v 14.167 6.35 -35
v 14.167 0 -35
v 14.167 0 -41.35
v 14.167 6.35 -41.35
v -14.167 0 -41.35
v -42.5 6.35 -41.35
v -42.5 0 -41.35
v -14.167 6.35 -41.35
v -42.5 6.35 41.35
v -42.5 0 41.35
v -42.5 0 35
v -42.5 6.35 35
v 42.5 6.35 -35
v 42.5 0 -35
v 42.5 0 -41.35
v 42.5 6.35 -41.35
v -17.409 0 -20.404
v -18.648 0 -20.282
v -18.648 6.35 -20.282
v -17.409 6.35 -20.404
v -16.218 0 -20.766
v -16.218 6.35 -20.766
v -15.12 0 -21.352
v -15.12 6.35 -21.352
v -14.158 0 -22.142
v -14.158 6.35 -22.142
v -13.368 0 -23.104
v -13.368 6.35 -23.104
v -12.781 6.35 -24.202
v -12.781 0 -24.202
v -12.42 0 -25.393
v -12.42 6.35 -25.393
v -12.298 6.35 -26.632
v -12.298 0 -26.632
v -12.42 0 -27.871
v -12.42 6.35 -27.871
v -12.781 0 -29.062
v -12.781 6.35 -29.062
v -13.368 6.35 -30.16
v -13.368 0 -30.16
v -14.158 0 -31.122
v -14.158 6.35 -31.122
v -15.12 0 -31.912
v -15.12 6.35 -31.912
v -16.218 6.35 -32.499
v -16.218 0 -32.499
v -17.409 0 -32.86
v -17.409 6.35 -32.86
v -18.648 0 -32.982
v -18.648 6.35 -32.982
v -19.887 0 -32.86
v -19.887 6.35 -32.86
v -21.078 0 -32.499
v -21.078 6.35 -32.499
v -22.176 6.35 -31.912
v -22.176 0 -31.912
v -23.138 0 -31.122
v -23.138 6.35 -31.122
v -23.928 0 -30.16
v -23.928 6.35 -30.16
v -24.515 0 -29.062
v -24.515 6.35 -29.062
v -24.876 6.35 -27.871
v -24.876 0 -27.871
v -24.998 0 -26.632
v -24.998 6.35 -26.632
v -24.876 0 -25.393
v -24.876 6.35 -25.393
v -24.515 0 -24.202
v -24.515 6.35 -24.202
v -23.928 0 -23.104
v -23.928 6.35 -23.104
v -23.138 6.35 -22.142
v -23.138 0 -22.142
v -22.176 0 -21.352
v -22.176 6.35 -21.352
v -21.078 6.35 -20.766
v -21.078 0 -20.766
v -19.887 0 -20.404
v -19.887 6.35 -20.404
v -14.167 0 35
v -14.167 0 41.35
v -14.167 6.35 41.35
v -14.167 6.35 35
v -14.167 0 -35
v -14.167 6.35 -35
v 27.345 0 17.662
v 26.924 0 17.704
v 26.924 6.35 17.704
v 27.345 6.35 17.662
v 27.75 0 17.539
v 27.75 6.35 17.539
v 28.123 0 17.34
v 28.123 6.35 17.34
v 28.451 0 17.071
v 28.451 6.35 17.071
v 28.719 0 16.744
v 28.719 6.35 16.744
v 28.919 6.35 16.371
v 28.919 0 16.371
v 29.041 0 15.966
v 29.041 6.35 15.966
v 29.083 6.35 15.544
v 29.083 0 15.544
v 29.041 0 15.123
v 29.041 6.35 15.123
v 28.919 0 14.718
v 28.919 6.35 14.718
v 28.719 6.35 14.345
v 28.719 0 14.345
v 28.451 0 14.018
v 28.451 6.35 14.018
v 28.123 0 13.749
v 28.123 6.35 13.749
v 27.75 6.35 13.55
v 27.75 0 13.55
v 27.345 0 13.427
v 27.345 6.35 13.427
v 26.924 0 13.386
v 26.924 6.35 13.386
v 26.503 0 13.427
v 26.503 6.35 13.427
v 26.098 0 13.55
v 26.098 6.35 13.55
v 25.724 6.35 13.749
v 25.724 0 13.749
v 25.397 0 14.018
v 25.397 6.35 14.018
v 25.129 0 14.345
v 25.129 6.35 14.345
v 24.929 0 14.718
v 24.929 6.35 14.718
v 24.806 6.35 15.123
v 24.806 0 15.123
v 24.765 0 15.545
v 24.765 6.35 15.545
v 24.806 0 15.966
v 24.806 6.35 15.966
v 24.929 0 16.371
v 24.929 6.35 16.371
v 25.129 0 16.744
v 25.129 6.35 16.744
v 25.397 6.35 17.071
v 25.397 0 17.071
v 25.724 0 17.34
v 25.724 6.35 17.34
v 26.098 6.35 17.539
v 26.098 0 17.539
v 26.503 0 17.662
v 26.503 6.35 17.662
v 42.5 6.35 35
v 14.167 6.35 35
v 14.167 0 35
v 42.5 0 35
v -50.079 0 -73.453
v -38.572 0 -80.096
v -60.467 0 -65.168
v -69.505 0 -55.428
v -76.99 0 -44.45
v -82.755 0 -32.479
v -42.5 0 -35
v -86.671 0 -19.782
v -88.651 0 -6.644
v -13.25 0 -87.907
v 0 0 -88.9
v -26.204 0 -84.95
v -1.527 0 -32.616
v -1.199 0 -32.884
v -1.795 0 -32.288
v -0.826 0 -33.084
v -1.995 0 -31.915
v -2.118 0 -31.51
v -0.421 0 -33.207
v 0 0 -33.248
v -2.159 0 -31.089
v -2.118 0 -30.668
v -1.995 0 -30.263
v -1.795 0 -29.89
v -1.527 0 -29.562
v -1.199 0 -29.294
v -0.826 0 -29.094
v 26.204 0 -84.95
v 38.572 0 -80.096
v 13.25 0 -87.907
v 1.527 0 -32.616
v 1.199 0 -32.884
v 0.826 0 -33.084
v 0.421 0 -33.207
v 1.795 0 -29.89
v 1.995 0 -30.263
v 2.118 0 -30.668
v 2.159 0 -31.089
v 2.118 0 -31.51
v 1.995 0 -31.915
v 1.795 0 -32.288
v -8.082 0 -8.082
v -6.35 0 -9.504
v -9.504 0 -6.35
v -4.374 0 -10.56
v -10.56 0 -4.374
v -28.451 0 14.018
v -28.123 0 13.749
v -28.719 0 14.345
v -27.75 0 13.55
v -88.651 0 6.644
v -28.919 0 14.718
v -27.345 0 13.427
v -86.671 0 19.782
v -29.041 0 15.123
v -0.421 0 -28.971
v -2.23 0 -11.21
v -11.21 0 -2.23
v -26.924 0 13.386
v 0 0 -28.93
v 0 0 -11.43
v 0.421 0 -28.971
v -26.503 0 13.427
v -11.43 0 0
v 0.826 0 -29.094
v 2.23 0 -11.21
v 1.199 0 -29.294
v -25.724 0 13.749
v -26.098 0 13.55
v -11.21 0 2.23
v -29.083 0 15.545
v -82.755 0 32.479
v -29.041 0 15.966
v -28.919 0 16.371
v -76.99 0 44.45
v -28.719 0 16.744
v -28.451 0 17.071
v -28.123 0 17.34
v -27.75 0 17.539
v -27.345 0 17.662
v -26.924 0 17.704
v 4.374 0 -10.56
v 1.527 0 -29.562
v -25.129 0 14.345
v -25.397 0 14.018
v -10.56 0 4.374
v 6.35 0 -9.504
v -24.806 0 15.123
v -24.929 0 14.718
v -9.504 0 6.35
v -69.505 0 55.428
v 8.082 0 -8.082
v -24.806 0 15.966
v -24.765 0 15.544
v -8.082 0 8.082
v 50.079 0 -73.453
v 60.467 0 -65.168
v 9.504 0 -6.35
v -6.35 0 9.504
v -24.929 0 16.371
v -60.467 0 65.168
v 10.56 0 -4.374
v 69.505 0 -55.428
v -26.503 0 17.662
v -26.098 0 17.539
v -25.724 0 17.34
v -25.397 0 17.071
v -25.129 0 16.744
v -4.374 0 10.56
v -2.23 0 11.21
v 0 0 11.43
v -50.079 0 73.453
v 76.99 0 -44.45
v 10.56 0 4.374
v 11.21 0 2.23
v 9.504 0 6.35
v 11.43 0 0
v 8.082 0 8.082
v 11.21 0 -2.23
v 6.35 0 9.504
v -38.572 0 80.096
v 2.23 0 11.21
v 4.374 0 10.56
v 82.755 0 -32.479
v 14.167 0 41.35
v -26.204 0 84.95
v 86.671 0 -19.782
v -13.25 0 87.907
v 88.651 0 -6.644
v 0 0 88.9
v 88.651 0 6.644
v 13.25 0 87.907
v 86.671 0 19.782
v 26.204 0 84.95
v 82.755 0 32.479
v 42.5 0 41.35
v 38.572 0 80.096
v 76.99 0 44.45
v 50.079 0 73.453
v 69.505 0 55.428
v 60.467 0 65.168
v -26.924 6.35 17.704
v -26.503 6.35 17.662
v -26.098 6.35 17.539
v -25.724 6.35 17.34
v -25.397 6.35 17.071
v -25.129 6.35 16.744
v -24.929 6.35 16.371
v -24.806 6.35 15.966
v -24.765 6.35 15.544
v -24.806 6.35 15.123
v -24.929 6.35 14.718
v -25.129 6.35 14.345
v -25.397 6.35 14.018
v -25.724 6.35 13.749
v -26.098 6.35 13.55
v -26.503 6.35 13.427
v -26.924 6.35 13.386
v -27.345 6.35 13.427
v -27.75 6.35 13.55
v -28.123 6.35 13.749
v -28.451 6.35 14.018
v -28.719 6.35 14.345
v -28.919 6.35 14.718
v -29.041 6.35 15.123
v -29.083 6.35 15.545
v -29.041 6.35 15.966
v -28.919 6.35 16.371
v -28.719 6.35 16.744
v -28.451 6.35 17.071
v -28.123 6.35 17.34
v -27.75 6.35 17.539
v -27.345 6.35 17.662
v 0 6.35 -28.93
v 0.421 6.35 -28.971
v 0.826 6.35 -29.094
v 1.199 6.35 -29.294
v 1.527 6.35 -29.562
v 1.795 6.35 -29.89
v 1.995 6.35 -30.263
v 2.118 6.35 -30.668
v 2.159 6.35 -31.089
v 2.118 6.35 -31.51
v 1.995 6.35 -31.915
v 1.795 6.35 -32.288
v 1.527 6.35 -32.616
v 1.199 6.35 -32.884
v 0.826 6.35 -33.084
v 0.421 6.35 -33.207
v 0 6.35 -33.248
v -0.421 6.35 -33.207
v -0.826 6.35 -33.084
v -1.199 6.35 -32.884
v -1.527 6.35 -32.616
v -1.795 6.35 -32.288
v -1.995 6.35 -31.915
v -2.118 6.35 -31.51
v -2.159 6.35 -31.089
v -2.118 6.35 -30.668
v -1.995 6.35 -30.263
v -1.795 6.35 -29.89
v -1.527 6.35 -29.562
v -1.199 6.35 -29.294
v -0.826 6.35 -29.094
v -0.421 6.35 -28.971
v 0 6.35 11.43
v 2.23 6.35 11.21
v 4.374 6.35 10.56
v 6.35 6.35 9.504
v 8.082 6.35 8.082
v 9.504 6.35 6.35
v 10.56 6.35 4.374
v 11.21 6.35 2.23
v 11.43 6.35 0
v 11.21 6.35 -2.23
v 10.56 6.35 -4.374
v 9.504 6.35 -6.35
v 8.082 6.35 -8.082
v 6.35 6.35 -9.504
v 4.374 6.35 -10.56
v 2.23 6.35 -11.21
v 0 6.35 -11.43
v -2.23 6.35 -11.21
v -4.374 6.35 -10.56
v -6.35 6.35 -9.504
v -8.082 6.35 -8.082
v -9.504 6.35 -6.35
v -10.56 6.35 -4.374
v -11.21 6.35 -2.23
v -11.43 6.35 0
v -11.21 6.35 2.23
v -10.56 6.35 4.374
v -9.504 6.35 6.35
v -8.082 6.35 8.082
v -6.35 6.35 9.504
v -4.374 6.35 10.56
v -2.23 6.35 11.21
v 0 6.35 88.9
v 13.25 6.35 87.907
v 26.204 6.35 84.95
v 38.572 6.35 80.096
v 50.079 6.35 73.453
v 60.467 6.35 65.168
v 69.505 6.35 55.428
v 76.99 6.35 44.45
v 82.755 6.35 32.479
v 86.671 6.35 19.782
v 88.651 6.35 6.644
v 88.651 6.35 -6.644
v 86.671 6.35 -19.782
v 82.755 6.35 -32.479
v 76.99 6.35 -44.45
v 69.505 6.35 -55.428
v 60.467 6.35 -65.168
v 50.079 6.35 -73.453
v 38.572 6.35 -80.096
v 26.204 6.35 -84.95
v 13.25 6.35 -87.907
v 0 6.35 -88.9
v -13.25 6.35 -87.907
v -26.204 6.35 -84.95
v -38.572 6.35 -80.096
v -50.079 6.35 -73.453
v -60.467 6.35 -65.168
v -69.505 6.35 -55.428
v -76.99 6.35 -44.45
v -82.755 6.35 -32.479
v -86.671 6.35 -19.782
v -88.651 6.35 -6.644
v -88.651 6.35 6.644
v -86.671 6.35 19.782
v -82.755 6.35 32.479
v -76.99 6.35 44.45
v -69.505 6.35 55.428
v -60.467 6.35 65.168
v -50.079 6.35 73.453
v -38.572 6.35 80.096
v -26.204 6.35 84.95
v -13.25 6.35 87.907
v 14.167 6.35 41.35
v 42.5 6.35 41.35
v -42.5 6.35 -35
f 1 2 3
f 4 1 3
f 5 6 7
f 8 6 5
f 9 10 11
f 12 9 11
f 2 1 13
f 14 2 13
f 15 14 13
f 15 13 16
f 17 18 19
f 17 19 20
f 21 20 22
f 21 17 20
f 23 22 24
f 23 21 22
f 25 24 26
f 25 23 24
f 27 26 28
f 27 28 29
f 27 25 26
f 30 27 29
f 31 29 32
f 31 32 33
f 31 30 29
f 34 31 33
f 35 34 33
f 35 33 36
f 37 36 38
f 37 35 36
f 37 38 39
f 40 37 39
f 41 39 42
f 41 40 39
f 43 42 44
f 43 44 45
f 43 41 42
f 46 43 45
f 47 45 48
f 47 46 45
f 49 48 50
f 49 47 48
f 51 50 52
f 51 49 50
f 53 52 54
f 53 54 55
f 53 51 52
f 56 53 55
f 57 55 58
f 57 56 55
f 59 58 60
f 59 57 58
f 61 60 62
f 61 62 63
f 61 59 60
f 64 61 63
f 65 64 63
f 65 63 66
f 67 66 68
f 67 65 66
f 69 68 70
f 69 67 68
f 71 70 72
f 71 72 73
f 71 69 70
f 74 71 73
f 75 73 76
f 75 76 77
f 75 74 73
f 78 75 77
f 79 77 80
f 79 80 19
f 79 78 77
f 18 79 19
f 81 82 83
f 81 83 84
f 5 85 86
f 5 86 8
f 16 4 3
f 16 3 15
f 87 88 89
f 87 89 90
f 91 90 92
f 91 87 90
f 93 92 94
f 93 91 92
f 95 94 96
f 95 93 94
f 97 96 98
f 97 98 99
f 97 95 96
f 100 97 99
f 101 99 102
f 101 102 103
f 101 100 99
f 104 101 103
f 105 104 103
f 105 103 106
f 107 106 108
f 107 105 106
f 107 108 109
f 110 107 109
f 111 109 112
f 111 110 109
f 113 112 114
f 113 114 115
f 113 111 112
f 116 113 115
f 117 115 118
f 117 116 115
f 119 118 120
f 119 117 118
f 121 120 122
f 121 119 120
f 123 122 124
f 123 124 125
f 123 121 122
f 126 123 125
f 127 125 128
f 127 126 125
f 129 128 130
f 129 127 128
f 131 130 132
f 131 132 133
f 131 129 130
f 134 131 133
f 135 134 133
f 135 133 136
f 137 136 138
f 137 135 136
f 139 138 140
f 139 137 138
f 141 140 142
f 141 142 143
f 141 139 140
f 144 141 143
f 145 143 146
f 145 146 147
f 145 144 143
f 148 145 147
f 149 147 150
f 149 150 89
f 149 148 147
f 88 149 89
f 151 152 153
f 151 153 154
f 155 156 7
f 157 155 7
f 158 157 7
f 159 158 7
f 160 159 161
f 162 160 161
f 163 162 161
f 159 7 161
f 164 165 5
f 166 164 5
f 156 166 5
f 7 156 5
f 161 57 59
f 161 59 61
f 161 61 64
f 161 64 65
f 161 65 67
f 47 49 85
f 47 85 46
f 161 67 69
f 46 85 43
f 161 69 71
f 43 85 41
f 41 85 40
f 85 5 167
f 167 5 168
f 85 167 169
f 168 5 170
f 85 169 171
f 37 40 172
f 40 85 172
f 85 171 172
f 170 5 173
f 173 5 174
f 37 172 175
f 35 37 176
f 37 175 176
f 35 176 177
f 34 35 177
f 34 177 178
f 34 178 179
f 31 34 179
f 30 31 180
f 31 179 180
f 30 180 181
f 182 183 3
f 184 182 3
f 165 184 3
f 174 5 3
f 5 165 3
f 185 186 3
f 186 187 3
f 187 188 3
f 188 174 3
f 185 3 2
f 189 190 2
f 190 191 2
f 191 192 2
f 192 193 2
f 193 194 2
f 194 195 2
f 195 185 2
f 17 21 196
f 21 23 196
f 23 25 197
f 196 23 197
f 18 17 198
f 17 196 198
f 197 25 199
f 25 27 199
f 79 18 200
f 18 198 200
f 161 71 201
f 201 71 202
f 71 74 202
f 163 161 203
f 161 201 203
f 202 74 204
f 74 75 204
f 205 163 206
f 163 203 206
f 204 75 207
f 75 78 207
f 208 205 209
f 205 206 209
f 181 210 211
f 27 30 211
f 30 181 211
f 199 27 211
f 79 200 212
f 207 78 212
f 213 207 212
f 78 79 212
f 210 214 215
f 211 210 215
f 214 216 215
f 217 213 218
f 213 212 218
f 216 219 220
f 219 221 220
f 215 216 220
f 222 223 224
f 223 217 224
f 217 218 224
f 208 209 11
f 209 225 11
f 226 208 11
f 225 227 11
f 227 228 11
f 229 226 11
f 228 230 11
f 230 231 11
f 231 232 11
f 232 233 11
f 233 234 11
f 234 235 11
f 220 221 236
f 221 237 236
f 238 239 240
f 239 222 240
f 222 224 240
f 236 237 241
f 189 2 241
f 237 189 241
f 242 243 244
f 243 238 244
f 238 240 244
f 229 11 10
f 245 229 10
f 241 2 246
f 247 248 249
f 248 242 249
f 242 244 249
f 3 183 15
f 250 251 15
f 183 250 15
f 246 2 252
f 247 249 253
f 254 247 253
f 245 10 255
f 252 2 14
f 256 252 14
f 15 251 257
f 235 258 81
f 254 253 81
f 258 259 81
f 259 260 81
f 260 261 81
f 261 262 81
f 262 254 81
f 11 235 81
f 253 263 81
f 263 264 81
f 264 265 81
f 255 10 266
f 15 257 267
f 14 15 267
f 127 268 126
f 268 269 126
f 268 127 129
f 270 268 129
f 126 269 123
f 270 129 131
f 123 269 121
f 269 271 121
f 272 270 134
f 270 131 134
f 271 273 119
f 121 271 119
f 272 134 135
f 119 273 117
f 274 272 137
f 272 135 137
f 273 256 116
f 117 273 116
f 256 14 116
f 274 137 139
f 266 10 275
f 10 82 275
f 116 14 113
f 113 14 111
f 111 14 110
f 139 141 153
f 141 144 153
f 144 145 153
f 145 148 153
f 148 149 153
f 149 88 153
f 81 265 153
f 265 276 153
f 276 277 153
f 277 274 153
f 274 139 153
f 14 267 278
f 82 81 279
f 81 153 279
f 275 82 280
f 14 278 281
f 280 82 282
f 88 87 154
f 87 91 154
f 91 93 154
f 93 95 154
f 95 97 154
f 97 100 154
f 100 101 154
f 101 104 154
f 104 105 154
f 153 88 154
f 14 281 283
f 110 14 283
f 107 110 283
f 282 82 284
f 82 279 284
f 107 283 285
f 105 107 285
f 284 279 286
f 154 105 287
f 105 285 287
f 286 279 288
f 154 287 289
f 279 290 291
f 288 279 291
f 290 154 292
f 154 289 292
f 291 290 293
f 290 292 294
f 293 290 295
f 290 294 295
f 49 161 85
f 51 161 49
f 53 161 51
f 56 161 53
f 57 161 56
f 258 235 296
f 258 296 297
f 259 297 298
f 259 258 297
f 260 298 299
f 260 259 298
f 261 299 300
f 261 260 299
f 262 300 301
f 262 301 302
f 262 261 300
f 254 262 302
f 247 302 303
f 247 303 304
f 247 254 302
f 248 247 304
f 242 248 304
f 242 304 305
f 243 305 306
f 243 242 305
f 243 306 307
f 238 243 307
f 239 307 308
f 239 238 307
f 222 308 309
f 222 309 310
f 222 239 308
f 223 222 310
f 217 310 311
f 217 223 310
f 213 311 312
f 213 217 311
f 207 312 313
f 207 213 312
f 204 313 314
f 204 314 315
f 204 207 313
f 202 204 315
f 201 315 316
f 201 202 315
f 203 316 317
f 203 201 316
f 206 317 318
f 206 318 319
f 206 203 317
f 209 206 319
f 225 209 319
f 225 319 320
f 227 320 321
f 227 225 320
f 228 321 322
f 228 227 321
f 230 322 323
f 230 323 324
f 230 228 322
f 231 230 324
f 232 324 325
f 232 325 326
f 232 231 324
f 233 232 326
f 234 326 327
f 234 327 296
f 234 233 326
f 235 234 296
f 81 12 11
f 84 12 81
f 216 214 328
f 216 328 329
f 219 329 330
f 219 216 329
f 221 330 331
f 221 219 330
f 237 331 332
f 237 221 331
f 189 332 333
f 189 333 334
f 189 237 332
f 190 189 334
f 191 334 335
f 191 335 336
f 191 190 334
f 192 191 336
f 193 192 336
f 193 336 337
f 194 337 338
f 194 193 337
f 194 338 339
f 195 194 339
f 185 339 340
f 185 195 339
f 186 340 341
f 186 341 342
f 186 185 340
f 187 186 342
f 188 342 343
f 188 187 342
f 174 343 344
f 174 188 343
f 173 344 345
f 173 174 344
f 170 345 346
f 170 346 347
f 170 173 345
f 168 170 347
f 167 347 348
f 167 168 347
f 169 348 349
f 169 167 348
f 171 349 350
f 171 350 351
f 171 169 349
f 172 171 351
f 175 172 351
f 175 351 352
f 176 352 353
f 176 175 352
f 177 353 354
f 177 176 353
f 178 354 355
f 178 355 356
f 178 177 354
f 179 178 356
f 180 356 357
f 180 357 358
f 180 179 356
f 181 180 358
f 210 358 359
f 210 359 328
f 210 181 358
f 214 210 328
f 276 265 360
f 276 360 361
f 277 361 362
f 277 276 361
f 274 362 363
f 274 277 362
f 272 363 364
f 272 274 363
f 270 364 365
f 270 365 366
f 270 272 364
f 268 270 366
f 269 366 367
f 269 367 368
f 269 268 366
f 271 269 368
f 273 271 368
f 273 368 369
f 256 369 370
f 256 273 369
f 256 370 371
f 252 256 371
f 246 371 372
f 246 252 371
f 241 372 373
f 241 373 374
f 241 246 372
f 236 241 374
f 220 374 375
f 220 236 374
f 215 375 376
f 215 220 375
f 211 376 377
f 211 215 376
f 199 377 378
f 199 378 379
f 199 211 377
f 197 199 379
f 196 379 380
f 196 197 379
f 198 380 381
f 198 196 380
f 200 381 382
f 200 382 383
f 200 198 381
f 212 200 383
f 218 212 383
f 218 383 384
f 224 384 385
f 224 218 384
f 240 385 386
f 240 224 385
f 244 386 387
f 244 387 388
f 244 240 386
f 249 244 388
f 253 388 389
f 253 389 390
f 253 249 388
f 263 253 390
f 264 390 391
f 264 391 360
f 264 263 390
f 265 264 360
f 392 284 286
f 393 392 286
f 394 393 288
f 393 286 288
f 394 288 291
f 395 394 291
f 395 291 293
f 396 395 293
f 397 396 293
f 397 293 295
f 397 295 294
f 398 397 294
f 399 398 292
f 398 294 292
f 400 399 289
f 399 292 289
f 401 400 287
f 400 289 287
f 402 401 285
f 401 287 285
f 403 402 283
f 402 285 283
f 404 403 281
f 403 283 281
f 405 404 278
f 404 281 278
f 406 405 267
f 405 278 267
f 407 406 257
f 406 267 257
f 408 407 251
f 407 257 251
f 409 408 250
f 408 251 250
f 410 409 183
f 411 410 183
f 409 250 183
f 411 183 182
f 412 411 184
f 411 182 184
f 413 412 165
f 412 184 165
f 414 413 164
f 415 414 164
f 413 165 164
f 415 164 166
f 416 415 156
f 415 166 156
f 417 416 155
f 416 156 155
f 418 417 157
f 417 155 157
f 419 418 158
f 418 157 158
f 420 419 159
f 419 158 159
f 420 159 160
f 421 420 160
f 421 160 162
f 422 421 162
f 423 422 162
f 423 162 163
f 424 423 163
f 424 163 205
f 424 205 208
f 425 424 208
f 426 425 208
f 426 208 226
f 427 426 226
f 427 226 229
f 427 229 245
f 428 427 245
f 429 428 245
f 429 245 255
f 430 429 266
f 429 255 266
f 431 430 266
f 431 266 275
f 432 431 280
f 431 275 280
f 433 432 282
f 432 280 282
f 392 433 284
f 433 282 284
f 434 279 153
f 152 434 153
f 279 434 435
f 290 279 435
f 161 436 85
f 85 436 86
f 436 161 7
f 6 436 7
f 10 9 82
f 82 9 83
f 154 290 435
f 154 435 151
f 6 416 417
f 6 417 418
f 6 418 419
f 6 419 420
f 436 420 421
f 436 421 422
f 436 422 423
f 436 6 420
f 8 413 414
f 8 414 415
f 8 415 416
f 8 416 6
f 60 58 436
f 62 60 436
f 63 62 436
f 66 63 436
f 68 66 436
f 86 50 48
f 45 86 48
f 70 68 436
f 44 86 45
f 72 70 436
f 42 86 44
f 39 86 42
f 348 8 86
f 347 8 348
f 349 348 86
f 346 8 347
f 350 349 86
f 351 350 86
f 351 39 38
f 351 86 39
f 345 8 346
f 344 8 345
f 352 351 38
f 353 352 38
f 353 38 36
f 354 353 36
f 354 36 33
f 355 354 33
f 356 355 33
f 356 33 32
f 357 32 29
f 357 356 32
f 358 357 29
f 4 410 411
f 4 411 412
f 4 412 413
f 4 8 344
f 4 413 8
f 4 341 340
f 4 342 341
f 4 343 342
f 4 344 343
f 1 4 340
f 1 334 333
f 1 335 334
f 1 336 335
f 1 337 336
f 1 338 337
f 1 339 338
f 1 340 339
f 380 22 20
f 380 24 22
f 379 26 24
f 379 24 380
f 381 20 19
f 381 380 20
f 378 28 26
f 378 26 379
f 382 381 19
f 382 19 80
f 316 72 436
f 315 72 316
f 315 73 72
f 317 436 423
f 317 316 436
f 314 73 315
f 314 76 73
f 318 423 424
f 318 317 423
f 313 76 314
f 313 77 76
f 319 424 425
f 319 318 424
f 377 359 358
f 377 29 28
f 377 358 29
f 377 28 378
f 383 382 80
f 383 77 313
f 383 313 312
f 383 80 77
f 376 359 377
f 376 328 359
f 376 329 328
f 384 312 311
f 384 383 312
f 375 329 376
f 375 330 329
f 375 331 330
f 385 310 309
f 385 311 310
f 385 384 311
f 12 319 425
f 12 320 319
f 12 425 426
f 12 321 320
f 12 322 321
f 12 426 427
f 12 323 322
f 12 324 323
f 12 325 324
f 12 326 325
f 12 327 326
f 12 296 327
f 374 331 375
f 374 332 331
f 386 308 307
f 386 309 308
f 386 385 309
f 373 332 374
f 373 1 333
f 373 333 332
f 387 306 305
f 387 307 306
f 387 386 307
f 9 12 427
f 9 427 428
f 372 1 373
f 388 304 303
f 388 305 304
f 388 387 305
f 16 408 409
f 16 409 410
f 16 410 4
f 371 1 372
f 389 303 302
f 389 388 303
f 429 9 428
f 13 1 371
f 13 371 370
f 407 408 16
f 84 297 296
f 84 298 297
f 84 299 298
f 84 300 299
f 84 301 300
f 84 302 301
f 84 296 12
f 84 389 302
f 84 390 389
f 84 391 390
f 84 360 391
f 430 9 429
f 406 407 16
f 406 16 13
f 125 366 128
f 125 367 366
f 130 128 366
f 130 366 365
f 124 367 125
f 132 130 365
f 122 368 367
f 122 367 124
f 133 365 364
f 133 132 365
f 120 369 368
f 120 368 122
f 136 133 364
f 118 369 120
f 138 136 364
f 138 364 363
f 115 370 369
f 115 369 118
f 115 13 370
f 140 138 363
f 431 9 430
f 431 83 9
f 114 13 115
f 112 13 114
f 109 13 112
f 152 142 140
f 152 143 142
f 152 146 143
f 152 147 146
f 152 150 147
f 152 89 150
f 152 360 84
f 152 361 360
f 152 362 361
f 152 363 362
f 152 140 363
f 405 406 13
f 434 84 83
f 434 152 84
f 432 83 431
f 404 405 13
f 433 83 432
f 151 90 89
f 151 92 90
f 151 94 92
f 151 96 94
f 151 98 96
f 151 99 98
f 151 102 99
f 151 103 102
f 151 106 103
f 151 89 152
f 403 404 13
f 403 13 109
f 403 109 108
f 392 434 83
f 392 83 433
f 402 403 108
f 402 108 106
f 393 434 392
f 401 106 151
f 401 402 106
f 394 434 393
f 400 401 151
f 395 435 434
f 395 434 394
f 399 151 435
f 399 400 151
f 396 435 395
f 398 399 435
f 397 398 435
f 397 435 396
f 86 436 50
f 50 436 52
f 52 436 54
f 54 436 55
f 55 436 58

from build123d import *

# Parameters (mm, degrees)
SKETCH1_R            = 88.9
SKETCH1_R_2          = 11.43
SKETCH1_R_3          = 2.159
SKETCH1_R_4          = 6.35
BODY_DEPTH           = 6.35
MOUNTING_TEETH_REACH = 127.884
SKETCH2_W            = 28.333333333
SKETCH2_H            = 6.35


with BuildPart() as part:
    # Sketch1 → Body (new body)
    with BuildSketch(Plane(origin=(0, 0, 0), x_dir=(1, 0, 0), z_dir=(0, 1, 0))):
        with Locations(Location((0, 0, 0), (0, 0, 270))):
            Circle(SKETCH1_R)
        with Locations(Location((0, 0, 0), (0, 0, 270))):
            Circle(SKETCH1_R_2, mode=Mode.SUBTRACT)
        with Locations(Location((0, 31.089, 0), (0, 0, 270))):
            Circle(SKETCH1_R_3, mode=Mode.SUBTRACT)
        with Locations(Location((26.923863778, -15.5445, 0), (0, 0, 270))):
            Circle(SKETCH1_R_3, mode=Mode.SUBTRACT)
        with Locations(Location((-26.923863778, -15.5445, 0), (0, 0, 270))):
            Circle(SKETCH1_R_3, mode=Mode.SUBTRACT)
        with Locations(Location((-18.648117099, 26.632271264, 0), (0, 0, 270))):
            Circle(SKETCH1_R_4, mode=Mode.SUBTRACT)
    extrude(amount=BODY_DEPTH)

    # Sketch2 → Mounting teeth (cut, up to next)
    with BuildSketch(Plane(origin=(0, 6.35, 0), x_dir=(1, 0, 0), z_dir=(0, 1, 0)), mode=Mode.PRIVATE) as mounting_teeth_sk1:
        with Locations((-28.333333334, 38.175)):
            Rectangle(SKETCH2_W, SKETCH2_H)
    mounting_teeth_tool1 = extrude(mounting_teeth_sk1.sketch, amount=-MOUNTING_TEETH_REACH, mode=Mode.PRIVATE) & part.part
    # Sketch2 → Mounting teeth (cut, up to next)
    with BuildSketch(Plane(origin=(0, 6.35, 0), x_dir=(1, 0, 0), z_dir=(0, 1, 0)), mode=Mode.PRIVATE) as mounting_teeth_sk2:
        with Locations((28.333333334, 38.175)):
            Rectangle(SKETCH2_W, SKETCH2_H)
    mounting_teeth_tool2 = extrude(mounting_teeth_sk2.sketch, amount=-MOUNTING_TEETH_REACH, mode=Mode.PRIVATE) & part.part
    # Sketch2 → Mounting teeth (cut, up to next)
    with BuildSketch(Plane(origin=(0, 6.35, 0), x_dir=(1, 0, 0), z_dir=(0, 1, 0)), mode=Mode.PRIVATE) as mounting_teeth_sk3:
        with Locations((28.333333334, -38.175)):
            Rectangle(SKETCH2_W, SKETCH2_H)
    mounting_teeth_tool3 = extrude(mounting_teeth_sk3.sketch, amount=-MOUNTING_TEETH_REACH, mode=Mode.PRIVATE) & part.part
    # Sketch2 → Mounting teeth (cut, up to next)
    with BuildSketch(Plane(origin=(0, 6.35, 0), x_dir=(1, 0, 0), z_dir=(0, 1, 0)), mode=Mode.PRIVATE) as mounting_teeth_sk4:
        with Locations((-28.333333334, -38.175)):
            Rectangle(SKETCH2_W, SKETCH2_H)
    mounting_teeth_tool4 = extrude(mounting_teeth_sk4.sketch, amount=-MOUNTING_TEETH_REACH, mode=Mode.PRIVATE) & part.part
    add(mounting_teeth_tool1.solids().sort_by_distance((-28.333333, 6.35, -38.175))[0], mode=Mode.SUBTRACT)
    add(mounting_teeth_tool2.solids().sort_by_distance((28.333333, 6.35, -38.175))[0], mode=Mode.SUBTRACT)
    add(mounting_teeth_tool3.solids().sort_by_distance((28.333333, 6.35, 38.175))[0], mode=Mode.SUBTRACT)
    add(mounting_teeth_tool4.solids().sort_by_distance((-28.333333, 6.35, 38.175))[0], mode=Mode.SUBTRACT)


solid = part.part
